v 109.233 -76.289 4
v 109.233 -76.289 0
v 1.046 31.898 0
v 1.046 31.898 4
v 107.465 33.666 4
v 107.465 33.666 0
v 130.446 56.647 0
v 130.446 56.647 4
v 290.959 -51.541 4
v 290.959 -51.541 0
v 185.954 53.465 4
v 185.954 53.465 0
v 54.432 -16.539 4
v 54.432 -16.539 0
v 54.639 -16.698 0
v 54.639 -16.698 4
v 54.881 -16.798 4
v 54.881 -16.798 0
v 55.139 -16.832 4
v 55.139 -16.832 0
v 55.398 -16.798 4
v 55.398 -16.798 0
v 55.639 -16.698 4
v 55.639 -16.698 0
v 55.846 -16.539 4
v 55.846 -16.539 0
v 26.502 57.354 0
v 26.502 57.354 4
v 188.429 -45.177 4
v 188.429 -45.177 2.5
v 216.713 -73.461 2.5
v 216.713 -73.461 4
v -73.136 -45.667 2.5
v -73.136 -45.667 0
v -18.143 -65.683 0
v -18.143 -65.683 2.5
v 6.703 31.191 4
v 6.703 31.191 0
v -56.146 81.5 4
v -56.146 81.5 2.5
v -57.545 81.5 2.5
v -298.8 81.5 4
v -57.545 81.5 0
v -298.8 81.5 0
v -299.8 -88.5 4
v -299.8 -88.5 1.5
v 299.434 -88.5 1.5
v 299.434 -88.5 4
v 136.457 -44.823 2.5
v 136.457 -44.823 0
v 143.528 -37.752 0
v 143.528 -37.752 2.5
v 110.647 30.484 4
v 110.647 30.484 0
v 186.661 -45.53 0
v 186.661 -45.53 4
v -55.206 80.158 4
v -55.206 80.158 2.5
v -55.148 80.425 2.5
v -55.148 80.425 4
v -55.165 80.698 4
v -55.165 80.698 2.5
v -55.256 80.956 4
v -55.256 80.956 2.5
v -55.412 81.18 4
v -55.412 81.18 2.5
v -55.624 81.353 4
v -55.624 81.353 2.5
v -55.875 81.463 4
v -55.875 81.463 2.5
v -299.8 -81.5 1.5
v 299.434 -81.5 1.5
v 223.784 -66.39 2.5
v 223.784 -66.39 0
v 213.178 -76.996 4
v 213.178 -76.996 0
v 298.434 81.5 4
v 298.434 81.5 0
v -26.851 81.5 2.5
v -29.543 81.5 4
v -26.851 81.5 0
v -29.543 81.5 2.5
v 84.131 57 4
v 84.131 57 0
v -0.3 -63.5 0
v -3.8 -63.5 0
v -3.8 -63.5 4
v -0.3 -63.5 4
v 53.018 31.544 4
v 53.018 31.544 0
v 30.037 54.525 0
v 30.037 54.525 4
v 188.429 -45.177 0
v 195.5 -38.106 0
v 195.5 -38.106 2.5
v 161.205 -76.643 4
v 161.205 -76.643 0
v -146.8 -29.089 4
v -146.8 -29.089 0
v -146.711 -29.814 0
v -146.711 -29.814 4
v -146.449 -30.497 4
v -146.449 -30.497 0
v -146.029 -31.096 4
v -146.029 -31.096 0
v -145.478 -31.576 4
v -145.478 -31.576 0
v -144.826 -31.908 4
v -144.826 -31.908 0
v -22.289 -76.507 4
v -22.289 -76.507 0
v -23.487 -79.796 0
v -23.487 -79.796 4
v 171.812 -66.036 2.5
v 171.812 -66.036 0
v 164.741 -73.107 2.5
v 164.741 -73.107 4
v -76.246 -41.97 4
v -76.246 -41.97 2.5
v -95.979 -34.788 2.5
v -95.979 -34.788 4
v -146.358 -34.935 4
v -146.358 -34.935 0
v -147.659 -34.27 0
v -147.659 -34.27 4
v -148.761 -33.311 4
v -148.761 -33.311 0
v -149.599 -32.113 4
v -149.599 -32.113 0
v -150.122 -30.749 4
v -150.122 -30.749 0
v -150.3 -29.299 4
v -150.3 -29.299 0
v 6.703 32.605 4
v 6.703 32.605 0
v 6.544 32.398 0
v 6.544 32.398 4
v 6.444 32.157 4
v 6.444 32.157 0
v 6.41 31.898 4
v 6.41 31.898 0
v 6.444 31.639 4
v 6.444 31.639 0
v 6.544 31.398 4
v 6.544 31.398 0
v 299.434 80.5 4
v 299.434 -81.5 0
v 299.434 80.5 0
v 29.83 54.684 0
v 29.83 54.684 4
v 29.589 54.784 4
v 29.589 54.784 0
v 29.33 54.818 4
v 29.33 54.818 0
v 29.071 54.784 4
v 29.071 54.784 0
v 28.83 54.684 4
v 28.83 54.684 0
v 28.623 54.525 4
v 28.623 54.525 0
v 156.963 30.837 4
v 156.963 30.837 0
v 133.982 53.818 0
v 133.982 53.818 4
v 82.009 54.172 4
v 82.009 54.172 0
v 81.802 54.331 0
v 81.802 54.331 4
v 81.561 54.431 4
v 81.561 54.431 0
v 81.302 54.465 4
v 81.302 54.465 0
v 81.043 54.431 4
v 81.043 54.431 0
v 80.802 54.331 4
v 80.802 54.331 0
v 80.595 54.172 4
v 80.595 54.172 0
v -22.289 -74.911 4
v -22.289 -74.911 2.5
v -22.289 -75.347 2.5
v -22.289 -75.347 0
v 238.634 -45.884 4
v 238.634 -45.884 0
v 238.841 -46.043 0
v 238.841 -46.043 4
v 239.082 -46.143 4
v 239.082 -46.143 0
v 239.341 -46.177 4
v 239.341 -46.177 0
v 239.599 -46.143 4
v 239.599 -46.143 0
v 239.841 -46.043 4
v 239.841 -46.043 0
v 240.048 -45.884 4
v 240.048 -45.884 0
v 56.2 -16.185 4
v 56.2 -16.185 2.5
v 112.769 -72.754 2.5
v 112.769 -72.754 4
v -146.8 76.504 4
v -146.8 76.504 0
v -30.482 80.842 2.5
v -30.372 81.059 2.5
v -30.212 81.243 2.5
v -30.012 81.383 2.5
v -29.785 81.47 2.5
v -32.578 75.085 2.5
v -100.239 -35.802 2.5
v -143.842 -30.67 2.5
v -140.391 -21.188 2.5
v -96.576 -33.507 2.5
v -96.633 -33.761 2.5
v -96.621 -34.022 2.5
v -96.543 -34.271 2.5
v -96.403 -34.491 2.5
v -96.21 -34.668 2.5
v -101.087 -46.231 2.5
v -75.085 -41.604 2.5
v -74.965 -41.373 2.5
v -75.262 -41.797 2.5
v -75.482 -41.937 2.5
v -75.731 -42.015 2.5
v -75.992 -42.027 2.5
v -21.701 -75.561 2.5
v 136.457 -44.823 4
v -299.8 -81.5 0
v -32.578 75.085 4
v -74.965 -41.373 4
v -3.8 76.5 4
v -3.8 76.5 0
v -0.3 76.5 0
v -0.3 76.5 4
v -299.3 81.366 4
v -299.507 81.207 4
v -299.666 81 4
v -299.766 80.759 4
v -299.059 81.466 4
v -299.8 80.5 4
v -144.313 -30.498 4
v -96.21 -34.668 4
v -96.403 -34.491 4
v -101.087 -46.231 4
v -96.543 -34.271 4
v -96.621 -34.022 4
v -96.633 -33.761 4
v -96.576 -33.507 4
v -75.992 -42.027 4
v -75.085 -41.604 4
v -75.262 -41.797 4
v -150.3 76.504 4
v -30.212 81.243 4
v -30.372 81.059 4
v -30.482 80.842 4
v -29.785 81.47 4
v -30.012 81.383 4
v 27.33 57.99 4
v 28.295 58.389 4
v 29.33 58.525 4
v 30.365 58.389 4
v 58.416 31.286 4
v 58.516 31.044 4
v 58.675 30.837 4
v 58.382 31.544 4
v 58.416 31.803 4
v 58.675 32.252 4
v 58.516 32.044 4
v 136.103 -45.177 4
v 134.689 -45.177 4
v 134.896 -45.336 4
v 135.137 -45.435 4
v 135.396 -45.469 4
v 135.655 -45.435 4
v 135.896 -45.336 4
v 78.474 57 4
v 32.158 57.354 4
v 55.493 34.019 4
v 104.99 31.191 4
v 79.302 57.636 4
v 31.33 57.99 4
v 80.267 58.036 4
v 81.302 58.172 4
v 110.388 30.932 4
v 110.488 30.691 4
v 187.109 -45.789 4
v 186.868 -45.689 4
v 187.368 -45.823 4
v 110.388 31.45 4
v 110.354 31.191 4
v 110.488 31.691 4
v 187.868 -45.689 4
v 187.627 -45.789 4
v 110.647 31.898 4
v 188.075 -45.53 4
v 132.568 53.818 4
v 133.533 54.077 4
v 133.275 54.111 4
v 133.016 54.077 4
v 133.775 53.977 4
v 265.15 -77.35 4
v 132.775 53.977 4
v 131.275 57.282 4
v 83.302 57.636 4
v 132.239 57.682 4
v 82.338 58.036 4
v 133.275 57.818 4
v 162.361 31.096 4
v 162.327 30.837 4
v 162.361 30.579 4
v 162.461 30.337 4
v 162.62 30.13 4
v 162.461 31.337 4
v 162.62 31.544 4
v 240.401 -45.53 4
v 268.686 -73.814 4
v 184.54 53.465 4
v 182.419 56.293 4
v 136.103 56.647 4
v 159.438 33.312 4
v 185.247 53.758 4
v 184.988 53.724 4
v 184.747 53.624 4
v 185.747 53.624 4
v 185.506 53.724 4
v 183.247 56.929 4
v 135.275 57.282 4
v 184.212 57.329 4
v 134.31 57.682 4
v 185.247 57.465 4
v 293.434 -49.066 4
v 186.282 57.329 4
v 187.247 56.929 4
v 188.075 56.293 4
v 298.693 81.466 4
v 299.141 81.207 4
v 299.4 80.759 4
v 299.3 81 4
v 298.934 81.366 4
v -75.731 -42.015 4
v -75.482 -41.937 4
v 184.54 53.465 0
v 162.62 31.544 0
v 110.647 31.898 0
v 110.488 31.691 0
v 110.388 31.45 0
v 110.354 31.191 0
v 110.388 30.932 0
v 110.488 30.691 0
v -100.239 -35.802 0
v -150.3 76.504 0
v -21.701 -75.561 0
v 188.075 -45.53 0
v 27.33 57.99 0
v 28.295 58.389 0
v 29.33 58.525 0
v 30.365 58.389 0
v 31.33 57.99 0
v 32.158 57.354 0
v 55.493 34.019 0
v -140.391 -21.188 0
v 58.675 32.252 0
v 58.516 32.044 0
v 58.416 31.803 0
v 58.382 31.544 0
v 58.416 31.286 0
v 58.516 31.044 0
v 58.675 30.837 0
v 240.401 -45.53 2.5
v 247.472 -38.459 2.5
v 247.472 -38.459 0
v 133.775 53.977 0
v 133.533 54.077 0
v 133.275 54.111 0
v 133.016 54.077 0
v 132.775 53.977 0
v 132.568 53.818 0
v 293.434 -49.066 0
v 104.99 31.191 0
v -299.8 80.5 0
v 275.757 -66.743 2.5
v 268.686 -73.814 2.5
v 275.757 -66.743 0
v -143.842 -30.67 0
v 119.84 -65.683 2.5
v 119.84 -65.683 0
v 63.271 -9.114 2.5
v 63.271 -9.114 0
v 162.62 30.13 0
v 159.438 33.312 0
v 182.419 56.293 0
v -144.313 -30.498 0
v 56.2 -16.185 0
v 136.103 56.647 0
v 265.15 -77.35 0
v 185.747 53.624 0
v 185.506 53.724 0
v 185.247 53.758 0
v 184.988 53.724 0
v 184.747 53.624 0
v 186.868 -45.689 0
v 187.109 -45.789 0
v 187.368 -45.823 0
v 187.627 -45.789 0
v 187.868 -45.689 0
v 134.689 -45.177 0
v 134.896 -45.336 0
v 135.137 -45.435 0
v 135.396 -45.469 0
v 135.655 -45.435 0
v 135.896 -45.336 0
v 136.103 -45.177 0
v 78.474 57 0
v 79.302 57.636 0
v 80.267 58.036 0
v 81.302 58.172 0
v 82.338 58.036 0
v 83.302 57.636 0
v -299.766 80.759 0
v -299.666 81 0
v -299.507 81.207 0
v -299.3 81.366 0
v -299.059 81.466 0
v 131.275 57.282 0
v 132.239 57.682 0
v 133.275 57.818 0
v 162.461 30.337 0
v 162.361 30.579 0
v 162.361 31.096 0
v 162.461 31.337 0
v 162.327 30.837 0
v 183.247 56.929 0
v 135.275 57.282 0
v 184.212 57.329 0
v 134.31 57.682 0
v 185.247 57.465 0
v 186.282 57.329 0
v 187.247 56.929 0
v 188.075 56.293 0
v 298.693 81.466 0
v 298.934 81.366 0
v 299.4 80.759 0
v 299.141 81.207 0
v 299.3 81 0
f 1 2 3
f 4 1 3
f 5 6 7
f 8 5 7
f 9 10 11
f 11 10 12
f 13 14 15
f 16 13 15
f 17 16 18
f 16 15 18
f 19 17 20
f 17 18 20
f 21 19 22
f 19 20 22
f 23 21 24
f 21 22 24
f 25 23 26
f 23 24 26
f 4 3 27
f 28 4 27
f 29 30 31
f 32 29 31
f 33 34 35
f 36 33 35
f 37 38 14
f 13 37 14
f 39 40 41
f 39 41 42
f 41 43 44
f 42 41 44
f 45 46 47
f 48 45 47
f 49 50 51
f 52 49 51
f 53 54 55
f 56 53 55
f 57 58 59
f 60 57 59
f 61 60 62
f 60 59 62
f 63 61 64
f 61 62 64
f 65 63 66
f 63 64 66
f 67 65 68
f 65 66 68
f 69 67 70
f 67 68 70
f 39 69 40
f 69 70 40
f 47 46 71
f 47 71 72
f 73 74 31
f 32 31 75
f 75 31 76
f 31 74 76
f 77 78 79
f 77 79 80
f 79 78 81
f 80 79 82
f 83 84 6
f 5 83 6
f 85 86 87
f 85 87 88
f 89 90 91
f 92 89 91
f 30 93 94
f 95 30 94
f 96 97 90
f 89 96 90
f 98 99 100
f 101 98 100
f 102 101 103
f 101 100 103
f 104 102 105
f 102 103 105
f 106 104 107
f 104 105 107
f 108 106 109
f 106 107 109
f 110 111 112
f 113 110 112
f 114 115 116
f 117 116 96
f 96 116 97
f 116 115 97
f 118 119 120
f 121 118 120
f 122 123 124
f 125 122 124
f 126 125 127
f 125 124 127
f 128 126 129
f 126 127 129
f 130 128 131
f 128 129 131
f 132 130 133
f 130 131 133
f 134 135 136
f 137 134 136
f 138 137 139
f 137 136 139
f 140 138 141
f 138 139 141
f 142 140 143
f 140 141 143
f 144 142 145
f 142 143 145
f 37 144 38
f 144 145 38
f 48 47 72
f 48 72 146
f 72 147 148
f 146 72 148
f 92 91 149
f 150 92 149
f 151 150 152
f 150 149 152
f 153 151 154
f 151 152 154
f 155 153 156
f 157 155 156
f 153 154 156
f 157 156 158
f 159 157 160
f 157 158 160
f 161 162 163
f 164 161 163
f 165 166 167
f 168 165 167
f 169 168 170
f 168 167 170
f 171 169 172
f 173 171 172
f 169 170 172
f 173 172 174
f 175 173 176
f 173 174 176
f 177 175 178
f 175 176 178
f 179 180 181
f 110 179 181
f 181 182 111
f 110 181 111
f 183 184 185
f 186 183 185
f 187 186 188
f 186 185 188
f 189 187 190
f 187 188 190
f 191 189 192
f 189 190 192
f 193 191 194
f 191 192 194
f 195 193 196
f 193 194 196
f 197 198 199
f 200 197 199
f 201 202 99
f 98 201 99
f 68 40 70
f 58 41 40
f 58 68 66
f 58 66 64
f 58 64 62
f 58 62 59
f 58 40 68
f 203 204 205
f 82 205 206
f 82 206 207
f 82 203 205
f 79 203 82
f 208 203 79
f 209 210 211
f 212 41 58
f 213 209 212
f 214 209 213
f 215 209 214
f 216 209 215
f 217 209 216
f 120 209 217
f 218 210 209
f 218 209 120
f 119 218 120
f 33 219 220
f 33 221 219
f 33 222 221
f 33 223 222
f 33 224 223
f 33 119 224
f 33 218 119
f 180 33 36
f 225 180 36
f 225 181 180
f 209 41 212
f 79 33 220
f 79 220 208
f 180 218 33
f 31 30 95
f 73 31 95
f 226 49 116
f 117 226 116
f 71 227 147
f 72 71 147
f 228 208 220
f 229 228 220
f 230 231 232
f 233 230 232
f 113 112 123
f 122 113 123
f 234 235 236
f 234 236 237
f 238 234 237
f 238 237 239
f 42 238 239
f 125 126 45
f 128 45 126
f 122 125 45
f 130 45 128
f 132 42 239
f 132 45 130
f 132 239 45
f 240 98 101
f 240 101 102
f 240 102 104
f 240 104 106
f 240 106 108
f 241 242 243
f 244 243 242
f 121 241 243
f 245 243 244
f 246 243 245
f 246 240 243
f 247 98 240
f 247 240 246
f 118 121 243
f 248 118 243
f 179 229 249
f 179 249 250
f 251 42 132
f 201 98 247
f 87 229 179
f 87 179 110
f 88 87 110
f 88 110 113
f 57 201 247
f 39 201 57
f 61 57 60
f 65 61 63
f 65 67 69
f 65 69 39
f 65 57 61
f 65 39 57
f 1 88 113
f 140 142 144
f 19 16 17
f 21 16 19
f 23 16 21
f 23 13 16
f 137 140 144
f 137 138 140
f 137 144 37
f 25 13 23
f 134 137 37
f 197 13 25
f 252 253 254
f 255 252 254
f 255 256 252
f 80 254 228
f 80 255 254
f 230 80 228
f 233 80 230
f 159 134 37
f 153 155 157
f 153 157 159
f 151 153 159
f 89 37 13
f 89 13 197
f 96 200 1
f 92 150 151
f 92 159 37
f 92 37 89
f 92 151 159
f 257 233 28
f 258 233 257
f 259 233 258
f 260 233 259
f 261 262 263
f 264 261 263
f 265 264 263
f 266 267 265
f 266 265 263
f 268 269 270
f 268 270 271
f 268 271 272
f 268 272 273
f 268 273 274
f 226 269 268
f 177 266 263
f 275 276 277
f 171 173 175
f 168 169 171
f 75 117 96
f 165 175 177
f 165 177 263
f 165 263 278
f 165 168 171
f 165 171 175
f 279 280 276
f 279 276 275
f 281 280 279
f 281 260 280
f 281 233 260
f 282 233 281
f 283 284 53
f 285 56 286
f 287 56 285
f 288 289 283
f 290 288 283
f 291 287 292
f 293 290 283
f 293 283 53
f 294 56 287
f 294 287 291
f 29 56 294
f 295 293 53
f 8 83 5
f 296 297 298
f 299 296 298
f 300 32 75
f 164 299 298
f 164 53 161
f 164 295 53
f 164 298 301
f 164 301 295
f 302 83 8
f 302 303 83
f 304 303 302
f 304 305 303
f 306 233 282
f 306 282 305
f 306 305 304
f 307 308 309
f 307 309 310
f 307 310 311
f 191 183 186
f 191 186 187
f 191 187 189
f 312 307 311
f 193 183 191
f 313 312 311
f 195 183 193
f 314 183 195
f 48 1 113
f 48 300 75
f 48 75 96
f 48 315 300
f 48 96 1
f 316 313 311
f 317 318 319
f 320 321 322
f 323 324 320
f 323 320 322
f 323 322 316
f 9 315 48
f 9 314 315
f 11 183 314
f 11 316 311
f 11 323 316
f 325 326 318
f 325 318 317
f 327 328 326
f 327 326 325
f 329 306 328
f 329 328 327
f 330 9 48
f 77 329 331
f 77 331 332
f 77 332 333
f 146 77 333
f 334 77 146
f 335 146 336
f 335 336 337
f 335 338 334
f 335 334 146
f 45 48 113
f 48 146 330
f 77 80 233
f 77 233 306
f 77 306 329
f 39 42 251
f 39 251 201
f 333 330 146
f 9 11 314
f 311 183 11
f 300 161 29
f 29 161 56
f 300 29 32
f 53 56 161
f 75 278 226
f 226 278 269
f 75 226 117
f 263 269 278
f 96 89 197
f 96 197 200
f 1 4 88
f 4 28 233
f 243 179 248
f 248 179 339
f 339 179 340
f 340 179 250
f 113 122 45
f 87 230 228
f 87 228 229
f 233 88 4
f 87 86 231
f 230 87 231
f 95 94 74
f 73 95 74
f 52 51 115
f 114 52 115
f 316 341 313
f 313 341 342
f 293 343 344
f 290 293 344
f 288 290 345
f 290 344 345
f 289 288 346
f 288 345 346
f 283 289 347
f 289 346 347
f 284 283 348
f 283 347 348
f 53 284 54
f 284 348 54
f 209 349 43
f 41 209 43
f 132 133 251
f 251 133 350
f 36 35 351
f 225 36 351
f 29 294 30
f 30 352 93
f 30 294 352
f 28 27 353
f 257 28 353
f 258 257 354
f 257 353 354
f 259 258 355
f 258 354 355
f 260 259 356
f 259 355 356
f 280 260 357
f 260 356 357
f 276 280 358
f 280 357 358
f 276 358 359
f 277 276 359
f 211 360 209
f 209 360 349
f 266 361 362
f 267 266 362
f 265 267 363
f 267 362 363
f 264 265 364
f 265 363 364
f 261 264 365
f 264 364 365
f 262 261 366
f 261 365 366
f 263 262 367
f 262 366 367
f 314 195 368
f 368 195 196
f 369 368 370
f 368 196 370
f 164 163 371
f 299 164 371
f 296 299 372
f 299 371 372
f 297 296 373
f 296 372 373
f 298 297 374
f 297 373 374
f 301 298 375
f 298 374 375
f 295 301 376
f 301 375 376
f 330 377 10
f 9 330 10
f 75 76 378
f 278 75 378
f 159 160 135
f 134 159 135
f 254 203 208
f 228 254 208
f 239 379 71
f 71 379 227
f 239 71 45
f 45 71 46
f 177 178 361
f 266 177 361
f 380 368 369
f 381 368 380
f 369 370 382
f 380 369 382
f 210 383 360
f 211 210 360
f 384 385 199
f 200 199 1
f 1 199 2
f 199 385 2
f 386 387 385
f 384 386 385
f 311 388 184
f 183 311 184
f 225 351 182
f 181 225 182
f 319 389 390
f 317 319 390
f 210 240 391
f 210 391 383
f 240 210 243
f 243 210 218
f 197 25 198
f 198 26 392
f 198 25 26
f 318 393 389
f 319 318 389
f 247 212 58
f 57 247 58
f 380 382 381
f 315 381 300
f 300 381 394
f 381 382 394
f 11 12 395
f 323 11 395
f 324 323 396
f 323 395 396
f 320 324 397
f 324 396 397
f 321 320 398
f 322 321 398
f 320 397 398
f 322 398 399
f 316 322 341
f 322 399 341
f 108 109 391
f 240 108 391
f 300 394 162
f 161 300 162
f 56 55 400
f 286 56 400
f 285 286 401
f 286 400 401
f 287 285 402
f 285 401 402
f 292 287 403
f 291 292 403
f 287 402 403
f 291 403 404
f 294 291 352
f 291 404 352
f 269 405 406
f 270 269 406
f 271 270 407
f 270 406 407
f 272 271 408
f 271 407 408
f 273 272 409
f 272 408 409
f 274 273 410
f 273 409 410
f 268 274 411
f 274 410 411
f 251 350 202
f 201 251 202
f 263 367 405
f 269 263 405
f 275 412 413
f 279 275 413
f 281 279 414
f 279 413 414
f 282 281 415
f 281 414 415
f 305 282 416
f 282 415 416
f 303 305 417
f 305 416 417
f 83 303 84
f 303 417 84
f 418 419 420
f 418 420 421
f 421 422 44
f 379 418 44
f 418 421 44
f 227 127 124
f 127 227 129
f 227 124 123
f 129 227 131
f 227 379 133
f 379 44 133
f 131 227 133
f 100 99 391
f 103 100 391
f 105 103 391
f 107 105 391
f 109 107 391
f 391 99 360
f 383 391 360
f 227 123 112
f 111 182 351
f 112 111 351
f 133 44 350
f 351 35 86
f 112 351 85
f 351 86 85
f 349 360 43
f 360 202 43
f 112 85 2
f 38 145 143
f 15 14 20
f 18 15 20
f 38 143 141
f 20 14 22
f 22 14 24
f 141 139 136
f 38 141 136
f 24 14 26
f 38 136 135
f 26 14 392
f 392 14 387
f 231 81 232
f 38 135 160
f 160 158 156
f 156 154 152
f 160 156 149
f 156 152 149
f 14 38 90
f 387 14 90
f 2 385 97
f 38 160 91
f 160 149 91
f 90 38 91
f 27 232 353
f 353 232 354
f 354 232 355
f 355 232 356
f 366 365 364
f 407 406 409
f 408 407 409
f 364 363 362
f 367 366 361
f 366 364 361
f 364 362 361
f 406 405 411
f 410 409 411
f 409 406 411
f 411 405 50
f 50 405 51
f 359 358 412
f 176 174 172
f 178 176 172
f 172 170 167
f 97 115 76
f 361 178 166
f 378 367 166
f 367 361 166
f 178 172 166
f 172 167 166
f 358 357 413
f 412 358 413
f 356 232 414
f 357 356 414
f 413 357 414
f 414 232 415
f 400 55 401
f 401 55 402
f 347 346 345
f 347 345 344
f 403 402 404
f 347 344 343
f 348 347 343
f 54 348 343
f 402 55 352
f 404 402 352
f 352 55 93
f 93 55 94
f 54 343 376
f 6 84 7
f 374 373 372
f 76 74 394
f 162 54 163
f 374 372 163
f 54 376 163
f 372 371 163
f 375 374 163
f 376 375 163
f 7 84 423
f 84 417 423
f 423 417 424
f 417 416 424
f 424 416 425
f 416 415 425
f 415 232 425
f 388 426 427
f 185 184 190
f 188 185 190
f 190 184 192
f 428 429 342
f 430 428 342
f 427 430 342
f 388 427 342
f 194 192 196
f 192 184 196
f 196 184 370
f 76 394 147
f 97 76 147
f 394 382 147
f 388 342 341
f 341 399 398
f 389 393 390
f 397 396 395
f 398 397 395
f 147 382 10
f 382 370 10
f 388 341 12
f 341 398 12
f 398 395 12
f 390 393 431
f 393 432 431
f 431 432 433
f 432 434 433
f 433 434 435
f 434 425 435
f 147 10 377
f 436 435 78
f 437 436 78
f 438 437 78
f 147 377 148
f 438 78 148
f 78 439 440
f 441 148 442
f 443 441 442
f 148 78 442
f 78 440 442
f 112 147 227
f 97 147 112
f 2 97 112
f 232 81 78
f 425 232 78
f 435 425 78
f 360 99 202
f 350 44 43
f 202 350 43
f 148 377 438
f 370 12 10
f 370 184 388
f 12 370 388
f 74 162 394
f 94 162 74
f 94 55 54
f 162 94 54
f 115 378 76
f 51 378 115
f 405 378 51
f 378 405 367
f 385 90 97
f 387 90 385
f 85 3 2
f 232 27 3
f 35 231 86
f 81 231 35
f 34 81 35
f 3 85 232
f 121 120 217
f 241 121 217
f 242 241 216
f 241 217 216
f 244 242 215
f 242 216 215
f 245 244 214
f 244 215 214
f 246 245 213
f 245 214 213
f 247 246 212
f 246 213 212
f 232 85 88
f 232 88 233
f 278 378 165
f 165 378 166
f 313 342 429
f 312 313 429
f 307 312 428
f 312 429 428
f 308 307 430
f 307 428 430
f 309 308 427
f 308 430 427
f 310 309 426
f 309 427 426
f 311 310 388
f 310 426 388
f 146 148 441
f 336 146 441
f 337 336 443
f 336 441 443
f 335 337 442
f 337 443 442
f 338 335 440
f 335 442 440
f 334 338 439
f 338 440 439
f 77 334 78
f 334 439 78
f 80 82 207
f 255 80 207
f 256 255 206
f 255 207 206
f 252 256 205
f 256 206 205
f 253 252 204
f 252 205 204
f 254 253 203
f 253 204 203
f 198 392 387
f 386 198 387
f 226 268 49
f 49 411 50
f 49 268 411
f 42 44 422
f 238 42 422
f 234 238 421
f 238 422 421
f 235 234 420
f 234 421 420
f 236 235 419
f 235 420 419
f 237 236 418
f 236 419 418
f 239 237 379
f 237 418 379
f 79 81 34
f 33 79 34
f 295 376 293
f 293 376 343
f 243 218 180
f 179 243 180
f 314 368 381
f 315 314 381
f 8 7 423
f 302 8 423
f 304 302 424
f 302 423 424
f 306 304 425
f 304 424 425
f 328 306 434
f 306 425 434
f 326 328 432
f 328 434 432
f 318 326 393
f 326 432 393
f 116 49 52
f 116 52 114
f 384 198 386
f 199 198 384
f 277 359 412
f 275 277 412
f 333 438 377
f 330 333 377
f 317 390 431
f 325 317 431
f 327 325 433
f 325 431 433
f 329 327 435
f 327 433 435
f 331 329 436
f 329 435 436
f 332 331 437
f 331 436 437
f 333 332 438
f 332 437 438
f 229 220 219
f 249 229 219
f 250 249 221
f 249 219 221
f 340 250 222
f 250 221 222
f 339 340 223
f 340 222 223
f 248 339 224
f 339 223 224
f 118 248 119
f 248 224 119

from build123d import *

# Parameters (mm, degrees)
F0_W     = 3.5
F0_H     = 140
F1_DEPTH = 4
F3_DEPTH = 2.5
F2_W     = 599.2343145751
F2_H     = 7
F4_DEPTH = 1.5


# Not quite as in the source:
# - a feature names something its author has since deleted; it is built from what else it names


with BuildPart() as f1:
    # F0 (on Top) → F1 (new body)
    with BuildSketch(Plane.XY):
        with BuildLine():
            Line((-299.8, -88.5), (299.4343145751, -88.5))
            Line((299.4343145751, -88.5), (299.4343145751, 80.5))
            ThreePointArc((299.4343145751, 80.5), (299.1414213562, 81.2071067812), (298.4343145751, 81.5))
            Line((298.4343145751, 81.5), (-29.5426009536, 81.5))
            ThreePointArc((-29.5426009536, 81.5), (-30.1161773899, 81.3191520443), (-30.4822935744, 80.8420201433))
            Line((-30.4822935744, 80.8420201433), (-32.577653202, 75.0850668809))
            Line((-32.577653202, 75.0850668809), (-74.9647554186, -41.3725393356))
            ThreePointArc((-74.9647554186, -41.3725393356), (-75.4818297777, -41.9368269793), (-76.2464681828, -41.9702118131))
            Line((-76.2464681828, -41.9702118131), (-95.9786819334, -34.7882733517))
            ThreePointArc((-95.9786819334, -34.7882733517), (-96.5429695771, -34.2711989926), (-96.5763544108, -33.5065605876))
            Line((-96.5763544108, -33.5065605876), (-55.2058449976, 80.1579798567))
            ThreePointArc((-55.2058449976, 80.1579798567), (-55.3263855741, 81.0735764364), (-56.1455376183, 81.5))
            Line((-56.1455376183, 81.5), (-175.9202302026, 81.5))
            Line((-175.9202302026, 81.5), (-202.5231668673, 81.5))
            Line((-202.5231668673, 81.5), (-298.8, 81.5))
            ThreePointArc((-298.8, 81.5), (-299.5071067812, 81.2071067812), (-299.8, 80.5))
            Line((-299.8, 80.5), (-299.8, -88.5))
        make_face()
        with BuildLine():
            ThreePointArc((182.4185499288, 56.2932249718), (185.2469770535, 57.4647978471), (188.0754041783, 56.2932249718))
            Line((188.0754041783, 56.2932249718), (293.4343145751, -49.0656854249))
            Line((293.4343145751, -49.0656854249), (290.9594408409, -51.5405591591))
            Line((290.9594408409, -51.5405591591), (185.9540838347, 53.4647978471))
            ThreePointArc((185.9540838347, 53.4647978471), (185.2469770535, 53.7576910659), (184.5398702723, 53.4647978471))
            Line((184.5398702723, 53.4647978471), (162.6195600555, 31.5444876303))
            ThreePointArc((162.6195600555, 31.5444876303), (162.3266668367, 30.8373808491), (162.6195600555, 30.1302740679))
            Line((162.6195600555, 30.1302740679), (238.6335390331, -45.8837049096))
            ThreePointArc((238.6335390331, -45.8837049096), (239.3406458143, -46.1765981284), (240.0477525955, -45.8837049096))
            Line((240.0477525955, -45.8837049096), (240.4013059861, -45.530151519))
            Line((240.4013059861, -45.530151519), (268.6855772335, -73.8144227665))
            Line((268.6855772335, -73.8144227665), (267.6249170617, -74.8750829383))
            Line((267.6249170617, -74.8750829383), (265.1500433276, -77.3499566724))
            Line((265.1500433276, -77.3499566724), (156.962705806, 30.8373808491))
            Line((156.962705806, 30.8373808491), (133.9817354175, 53.8183512377))
            ThreePointArc((133.9817354175, 53.8183512377), (133.2746286363, 54.1112444565), (132.5675218551, 53.8183512377))
            Line((132.5675218551, 53.8183512377), (110.6472116383, 31.8980410209))
            ThreePointArc((110.6472116383, 31.8980410209), (110.3543184195, 31.1909342397), (110.6472116383, 30.4838274585))
            Line((110.6472116383, 30.4838274585), (186.6611906159, -45.530151519))
            ThreePointArc((186.6611906159, -45.530151519), (187.3682973971, -45.8230447378), (188.0754041783, -45.530151519))
            Line((188.0754041783, -45.530151519), (188.4289575688, -45.1765981284))
            Line((188.4289575688, -45.1765981284), (216.7132288163, -73.4608693759))
            Line((216.7132288163, -73.4608693759), (215.6525686445, -74.5215295477))
            Line((215.6525686445, -74.5215295477), (213.1776949104, -76.9964032818))
            Line((213.1776949104, -76.9964032818), (104.9903573888, 31.1909342397))
            Line((104.9903573888, 31.1909342397), (82.0093870003, 54.1719046283))
            ThreePointArc((82.0093870003, 54.1719046283), (81.3022802191, 54.4647978471), (80.5951734379, 54.1719046283))
            Line((80.5951734379, 54.1719046283), (58.6748632211, 32.2515944115))
            ThreePointArc((58.6748632211, 32.2515944115), (58.3819700023, 31.5444876303), (58.6748632211, 30.8373808491))
            Line((58.6748632211, 30.8373808491), (134.6888421987, -45.1765981284))
            ThreePointArc((134.6888421987, -45.1765981284), (135.3959489799, -45.4694913472), (136.103055761, -45.1765981284))
            Line((136.103055761, -45.1765981284), (136.4566091516, -44.8230447378))
            Line((136.4566091516, -44.8230447378), (164.7408803991, -73.1073159853))
            Line((164.7408803991, -73.1073159853), (163.6802202273, -74.1679761571))
            Line((163.6802202273, -74.1679761571), (161.2053464932, -76.6428498912))
            Line((161.2053464932, -76.6428498912), (53.0180089716, 31.5444876303))
            Line((53.0180089716, 31.5444876303), (30.0370385831, 54.5254580189))
            ThreePointArc((30.0370385831, 54.5254580189), (29.3299318019, 54.8183512377), (28.6228250207, 54.5254580189))
            Line((28.6228250207, 54.5254580189), (6.7025148039, 32.6051478021))
            ThreePointArc((6.7025148039, 32.6051478021), (6.4096215851, 31.8980410209), (6.7025148039, 31.1909342397))
            Line((6.7025148039, 31.1909342397), (54.432222534, -16.5387734904))
            ThreePointArc((54.432222534, -16.5387734904), (55.1393293152, -16.8316667092), (55.8464360964, -16.5387734904))
            Line((55.8464360964, -16.5387734904), (56.199989487, -16.1852200998))
            Line((56.199989487, -16.1852200998), (112.7685319819, -72.7537625947))
            Line((112.7685319819, -72.7537625947), (111.7078718101, -73.8144227665))
            Line((111.7078718101, -73.8144227665), (109.232998076, -76.2892965006))
            Line((109.232998076, -76.2892965006), (1.0456605544, 31.8980410209))
            Line((1.0456605544, 31.8980410209), (26.5015046771, 57.3538851436))
            ThreePointArc((26.5015046771, 57.3538851436), (29.3299318019, 58.5254580189), (32.1583589266, 57.3538851436))
            Line((32.1583589266, 57.3538851436), (55.4928827058, 34.0193613645))
            Line((55.4928827058, 34.0193613645), (78.4738530943, 57.000331753))
            ThreePointArc((78.4738530943, 57.000331753), (81.3022802191, 58.1719046283), (84.1307073438, 57.000331753))
            Line((84.1307073438, 57.000331753), (107.465231123, 33.6658079739))
            Line((107.465231123, 33.6658079739), (130.4462015116, 56.6467783624))
            ThreePointArc((130.4462015116, 56.6467783624), (133.2746286363, 57.8183512377), (136.103055761, 56.6467783624))
            Line((136.103055761, 56.6467783624), (159.4375795402, 33.3122545833))
            Line((159.4375795402, 33.3122545833), (182.4185499288, 56.2932249718))
        make_face(mode=Mode.SUBTRACT)
        with BuildLine():
            Line((-150.3, -29.2987547707), (-150.3, 76.504496433))
            Line((-150.3, 76.504496433), (-146.8, 76.504496433))
            Line((-146.8, 76.504496433), (-146.8, -29.0886925093))
            ThreePointArc((-146.8, -29.0886925093), (-146.2574561329, -30.8094218183), (-144.82606043, -31.9077703716))
            Line((-144.82606043, -31.9077703716), (-144.313030215, -30.4982314405))
            Line((-144.313030215, -30.4982314405), (-101.0871696588, -46.2311580334))
            Line((-101.0871696588, -46.2311580334), (-69.1376205521, -57.8598429065))
            Line((-69.1376205521, -57.8598429065), (-22.2894341652, -74.9111882807))
            Line((-22.2894341652, -74.9111882807), (-22.2894341652, -76.5074549394))
            Line((-22.2894341652, -76.5074549394), (-23.4865046669, -79.7963791122))
            Line((-23.4865046669, -79.7963791122), (-146.3577922078, -34.9348430622))
            ThreePointArc((-146.3577922078, -34.9348430622), (-149.2166428204, -32.7377405771), (-150.3, -29.2987547707))
        make_face(mode=Mode.SUBTRACT)
        with Locations((-2.05, 6.5)):
            Rectangle(F0_W, F0_H, mode=Mode.SUBTRACT)
    extrude(amount=F1_DEPTH)

    # F2 (on face) → F3 (cut)
    with BuildSketch(Plane(origin=(0, 0, 0), x_dir=(1, 0, 0), z_dir=(0, 0, -1))):
        Polygon((275.7566450454, 66.7433549546), (268.6855772335, 73.8144227665), (240.4013059861, 45.530151519), (247.4723737979, 38.4590837072), align=None)
        Polygon((216.7132288163, 73.4608693759), (188.4289575688, 45.1765981284), (195.5000253807, 38.1055303166), (223.7842966282, 66.389801564), align=None)
        Polygon((164.7408803991, 73.1073159853), (136.4566091516, 44.8230447378), (143.5276769635, 37.751976926), (171.811948211, 66.0362481734), align=None)
        Polygon((119.8395997938, 65.6826947828), (112.7685319819, 72.7537625947), (56.199989487, 16.1852200998), (63.2710572988, 9.1141522879), align=None)
        with BuildLine():
            Line((-56.1455376183, -81.5), (-57.5446454063, -81.5))
            Line((-57.5446454063, -81.5), (-55.4138746932, -87.3542444202))
            Line((-55.4138746932, -87.3542444202), (-52.4068583067, -86.2597799616))
            Line((-52.4068583067, -86.2597799616), (-95.9935465755, 33.3700433199))
            Line((-95.9935465755, 33.3700433199), (-75.1543020742, 41.3004074501))
            Line((-75.1543020742, 41.3004074501), (-28.7703498409, -86.1384539359))
            Line((-28.7703498409, -86.1384539359), (-28.5940280937, -86.0677343446))
            Line((-28.5940280937, -86.0677343446), (-25.5870117072, -84.9732698859))
            Line((-25.5870117072, -84.9732698859), (-26.8511785612, -81.5))
            Line((-26.8511785612, -81.5), (-29.5426009536, -81.5))
            ThreePointArc((-29.5426009536, -81.5), (-30.1161773899, -81.3191520443), (-30.4822935744, -80.8420201433))
            Line((-30.4822935744, -80.8420201433), (-74.9647554186, 41.3725393356))
            ThreePointArc((-74.9647554186, 41.3725393356), (-75.4818297777, 41.9368269793), (-76.2464681828, 41.9702118131))
            Line((-76.2464681828, 41.9702118131), (-95.9786819334, 34.7882733517))
            ThreePointArc((-95.9786819334, 34.7882733517), (-96.5429695771, 34.2711989926), (-96.5763544108, 33.5065605876))
            Line((-96.5763544108, 33.5065605876), (-55.2058449976, -80.1579798567))
            ThreePointArc((-55.2058449976, -80.1579798567), (-55.3263855741, -81.0735764364), (-56.1455376183, -81.5))
        make_face()
        with BuildLine():
            Line((-100.2390988931, 35.8020468909), (-57.5446454063, -81.5))
            Line((-57.5446454063, -81.5), (-56.1455376183, -81.5))
            ThreePointArc((-56.1455376183, -81.5), (-55.3263855741, -81.0735764364), (-55.2058449976, -80.1579798567))
            Line((-55.2058449976, -80.1579798567), (-96.5763544108, 33.5065605876))
            ThreePointArc((-96.5763544108, 33.5065605876), (-96.5429695771, 34.2711989926), (-95.9786819334, 34.7882733517))
            Line((-95.9786819334, 34.7882733517), (-76.2464681828, 41.9702118131))
            ThreePointArc((-76.2464681828, 41.9702118131), (-75.4818297777, 41.9368269793), (-74.9647554186, 41.3725393356))
            Line((-74.9647554186, 41.3725393356), (-30.4822935744, -80.8420201433))
            ThreePointArc((-30.4822935744, -80.8420201433), (-30.1161773899, -81.3191520443), (-29.5426009536, -81.5))
            Line((-29.5426009536, -81.5), (-26.8511785612, -81.5))
            Line((-26.8511785612, -81.5), (-73.1360856122, 45.666736984))
            Line((-73.1360856122, 45.666736984), (-18.1429199874, 65.6826123595))
            Line((-18.1429199874, 65.6826123595), (-21.7011533658, 75.5613879342))
            Line((-21.7011533658, 75.5613879342), (-22.2894341652, 75.3472712338))
            Line((-22.2894341652, 75.3472712338), (-22.2894341652, 74.9111882807))
            Line((-22.2894341652, 74.9111882807), (-143.8418430652, 30.6697295378))
            Line((-143.8418430652, 30.6697295378), (-140.3907859198, 21.1880279576))
            Line((-140.3907859198, 21.1880279576), (-100.2390988931, 35.8020468909))
        make_face()
    extrude(amount=-F3_DEPTH, mode=Mode.SUBTRACT)

    # F2 (on face) → F4 (cut)
    with BuildSketch(Plane(origin=(0, 0, 0), x_dir=(1, 0, 0), z_dir=(0, 0, -1))):
        with Locations((-0.1828427125, 85)):
            Rectangle(F2_W, F2_H)
    extrude(amount=-F4_DEPTH, mode=Mode.SUBTRACT)


solid = f1.part
